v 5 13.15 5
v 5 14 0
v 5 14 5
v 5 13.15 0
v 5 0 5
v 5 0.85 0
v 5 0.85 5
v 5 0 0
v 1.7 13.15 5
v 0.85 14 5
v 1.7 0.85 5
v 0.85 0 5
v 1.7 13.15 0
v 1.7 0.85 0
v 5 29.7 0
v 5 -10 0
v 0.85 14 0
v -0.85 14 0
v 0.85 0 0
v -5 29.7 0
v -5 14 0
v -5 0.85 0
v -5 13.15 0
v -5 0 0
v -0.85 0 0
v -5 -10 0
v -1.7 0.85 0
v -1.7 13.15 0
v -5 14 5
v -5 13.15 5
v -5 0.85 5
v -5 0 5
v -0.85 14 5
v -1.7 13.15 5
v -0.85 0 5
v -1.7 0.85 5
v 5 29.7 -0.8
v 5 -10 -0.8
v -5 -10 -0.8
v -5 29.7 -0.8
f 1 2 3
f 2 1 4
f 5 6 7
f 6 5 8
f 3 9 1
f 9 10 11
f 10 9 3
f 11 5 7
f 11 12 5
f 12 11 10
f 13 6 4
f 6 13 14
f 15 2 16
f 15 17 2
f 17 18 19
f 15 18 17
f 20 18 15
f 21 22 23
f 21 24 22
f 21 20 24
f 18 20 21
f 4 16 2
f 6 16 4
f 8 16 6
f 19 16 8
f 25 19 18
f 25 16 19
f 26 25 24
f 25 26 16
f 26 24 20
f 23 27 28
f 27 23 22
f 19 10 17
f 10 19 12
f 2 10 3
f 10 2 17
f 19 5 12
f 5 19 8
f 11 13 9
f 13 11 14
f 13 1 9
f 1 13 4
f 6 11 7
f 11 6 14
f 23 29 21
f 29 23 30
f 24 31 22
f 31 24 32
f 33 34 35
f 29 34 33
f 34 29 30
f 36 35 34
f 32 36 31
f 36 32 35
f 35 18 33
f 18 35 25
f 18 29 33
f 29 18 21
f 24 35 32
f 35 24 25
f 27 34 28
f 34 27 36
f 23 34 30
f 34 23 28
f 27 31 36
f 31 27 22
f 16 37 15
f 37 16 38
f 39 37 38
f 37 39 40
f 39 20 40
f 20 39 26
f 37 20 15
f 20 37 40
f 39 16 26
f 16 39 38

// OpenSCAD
wall = 0.85;
width = 10;
thickness = 0.8;
depth = 5;

module clip( size = 14, overhang = 10 )
{
    module walls( size )
    {
        translate( [ wall,0,0 ] )
        difference() {
            cube( [width / 2 - wall, size, depth ] );
            translate( [wall, wall, 0 ] )
            cube( [ width / 2 - wall, size - wall*2, depth ] );
        }
    }
    
    l = size * 2 + wall * 2 + overhang;
    translate( [ -width / 2, -overhang, -thickness ] )
    cube( [ width, l, thickness] );

    walls( size );
    mirror( [1,0,0] )
    walls( size );
}


clip();
